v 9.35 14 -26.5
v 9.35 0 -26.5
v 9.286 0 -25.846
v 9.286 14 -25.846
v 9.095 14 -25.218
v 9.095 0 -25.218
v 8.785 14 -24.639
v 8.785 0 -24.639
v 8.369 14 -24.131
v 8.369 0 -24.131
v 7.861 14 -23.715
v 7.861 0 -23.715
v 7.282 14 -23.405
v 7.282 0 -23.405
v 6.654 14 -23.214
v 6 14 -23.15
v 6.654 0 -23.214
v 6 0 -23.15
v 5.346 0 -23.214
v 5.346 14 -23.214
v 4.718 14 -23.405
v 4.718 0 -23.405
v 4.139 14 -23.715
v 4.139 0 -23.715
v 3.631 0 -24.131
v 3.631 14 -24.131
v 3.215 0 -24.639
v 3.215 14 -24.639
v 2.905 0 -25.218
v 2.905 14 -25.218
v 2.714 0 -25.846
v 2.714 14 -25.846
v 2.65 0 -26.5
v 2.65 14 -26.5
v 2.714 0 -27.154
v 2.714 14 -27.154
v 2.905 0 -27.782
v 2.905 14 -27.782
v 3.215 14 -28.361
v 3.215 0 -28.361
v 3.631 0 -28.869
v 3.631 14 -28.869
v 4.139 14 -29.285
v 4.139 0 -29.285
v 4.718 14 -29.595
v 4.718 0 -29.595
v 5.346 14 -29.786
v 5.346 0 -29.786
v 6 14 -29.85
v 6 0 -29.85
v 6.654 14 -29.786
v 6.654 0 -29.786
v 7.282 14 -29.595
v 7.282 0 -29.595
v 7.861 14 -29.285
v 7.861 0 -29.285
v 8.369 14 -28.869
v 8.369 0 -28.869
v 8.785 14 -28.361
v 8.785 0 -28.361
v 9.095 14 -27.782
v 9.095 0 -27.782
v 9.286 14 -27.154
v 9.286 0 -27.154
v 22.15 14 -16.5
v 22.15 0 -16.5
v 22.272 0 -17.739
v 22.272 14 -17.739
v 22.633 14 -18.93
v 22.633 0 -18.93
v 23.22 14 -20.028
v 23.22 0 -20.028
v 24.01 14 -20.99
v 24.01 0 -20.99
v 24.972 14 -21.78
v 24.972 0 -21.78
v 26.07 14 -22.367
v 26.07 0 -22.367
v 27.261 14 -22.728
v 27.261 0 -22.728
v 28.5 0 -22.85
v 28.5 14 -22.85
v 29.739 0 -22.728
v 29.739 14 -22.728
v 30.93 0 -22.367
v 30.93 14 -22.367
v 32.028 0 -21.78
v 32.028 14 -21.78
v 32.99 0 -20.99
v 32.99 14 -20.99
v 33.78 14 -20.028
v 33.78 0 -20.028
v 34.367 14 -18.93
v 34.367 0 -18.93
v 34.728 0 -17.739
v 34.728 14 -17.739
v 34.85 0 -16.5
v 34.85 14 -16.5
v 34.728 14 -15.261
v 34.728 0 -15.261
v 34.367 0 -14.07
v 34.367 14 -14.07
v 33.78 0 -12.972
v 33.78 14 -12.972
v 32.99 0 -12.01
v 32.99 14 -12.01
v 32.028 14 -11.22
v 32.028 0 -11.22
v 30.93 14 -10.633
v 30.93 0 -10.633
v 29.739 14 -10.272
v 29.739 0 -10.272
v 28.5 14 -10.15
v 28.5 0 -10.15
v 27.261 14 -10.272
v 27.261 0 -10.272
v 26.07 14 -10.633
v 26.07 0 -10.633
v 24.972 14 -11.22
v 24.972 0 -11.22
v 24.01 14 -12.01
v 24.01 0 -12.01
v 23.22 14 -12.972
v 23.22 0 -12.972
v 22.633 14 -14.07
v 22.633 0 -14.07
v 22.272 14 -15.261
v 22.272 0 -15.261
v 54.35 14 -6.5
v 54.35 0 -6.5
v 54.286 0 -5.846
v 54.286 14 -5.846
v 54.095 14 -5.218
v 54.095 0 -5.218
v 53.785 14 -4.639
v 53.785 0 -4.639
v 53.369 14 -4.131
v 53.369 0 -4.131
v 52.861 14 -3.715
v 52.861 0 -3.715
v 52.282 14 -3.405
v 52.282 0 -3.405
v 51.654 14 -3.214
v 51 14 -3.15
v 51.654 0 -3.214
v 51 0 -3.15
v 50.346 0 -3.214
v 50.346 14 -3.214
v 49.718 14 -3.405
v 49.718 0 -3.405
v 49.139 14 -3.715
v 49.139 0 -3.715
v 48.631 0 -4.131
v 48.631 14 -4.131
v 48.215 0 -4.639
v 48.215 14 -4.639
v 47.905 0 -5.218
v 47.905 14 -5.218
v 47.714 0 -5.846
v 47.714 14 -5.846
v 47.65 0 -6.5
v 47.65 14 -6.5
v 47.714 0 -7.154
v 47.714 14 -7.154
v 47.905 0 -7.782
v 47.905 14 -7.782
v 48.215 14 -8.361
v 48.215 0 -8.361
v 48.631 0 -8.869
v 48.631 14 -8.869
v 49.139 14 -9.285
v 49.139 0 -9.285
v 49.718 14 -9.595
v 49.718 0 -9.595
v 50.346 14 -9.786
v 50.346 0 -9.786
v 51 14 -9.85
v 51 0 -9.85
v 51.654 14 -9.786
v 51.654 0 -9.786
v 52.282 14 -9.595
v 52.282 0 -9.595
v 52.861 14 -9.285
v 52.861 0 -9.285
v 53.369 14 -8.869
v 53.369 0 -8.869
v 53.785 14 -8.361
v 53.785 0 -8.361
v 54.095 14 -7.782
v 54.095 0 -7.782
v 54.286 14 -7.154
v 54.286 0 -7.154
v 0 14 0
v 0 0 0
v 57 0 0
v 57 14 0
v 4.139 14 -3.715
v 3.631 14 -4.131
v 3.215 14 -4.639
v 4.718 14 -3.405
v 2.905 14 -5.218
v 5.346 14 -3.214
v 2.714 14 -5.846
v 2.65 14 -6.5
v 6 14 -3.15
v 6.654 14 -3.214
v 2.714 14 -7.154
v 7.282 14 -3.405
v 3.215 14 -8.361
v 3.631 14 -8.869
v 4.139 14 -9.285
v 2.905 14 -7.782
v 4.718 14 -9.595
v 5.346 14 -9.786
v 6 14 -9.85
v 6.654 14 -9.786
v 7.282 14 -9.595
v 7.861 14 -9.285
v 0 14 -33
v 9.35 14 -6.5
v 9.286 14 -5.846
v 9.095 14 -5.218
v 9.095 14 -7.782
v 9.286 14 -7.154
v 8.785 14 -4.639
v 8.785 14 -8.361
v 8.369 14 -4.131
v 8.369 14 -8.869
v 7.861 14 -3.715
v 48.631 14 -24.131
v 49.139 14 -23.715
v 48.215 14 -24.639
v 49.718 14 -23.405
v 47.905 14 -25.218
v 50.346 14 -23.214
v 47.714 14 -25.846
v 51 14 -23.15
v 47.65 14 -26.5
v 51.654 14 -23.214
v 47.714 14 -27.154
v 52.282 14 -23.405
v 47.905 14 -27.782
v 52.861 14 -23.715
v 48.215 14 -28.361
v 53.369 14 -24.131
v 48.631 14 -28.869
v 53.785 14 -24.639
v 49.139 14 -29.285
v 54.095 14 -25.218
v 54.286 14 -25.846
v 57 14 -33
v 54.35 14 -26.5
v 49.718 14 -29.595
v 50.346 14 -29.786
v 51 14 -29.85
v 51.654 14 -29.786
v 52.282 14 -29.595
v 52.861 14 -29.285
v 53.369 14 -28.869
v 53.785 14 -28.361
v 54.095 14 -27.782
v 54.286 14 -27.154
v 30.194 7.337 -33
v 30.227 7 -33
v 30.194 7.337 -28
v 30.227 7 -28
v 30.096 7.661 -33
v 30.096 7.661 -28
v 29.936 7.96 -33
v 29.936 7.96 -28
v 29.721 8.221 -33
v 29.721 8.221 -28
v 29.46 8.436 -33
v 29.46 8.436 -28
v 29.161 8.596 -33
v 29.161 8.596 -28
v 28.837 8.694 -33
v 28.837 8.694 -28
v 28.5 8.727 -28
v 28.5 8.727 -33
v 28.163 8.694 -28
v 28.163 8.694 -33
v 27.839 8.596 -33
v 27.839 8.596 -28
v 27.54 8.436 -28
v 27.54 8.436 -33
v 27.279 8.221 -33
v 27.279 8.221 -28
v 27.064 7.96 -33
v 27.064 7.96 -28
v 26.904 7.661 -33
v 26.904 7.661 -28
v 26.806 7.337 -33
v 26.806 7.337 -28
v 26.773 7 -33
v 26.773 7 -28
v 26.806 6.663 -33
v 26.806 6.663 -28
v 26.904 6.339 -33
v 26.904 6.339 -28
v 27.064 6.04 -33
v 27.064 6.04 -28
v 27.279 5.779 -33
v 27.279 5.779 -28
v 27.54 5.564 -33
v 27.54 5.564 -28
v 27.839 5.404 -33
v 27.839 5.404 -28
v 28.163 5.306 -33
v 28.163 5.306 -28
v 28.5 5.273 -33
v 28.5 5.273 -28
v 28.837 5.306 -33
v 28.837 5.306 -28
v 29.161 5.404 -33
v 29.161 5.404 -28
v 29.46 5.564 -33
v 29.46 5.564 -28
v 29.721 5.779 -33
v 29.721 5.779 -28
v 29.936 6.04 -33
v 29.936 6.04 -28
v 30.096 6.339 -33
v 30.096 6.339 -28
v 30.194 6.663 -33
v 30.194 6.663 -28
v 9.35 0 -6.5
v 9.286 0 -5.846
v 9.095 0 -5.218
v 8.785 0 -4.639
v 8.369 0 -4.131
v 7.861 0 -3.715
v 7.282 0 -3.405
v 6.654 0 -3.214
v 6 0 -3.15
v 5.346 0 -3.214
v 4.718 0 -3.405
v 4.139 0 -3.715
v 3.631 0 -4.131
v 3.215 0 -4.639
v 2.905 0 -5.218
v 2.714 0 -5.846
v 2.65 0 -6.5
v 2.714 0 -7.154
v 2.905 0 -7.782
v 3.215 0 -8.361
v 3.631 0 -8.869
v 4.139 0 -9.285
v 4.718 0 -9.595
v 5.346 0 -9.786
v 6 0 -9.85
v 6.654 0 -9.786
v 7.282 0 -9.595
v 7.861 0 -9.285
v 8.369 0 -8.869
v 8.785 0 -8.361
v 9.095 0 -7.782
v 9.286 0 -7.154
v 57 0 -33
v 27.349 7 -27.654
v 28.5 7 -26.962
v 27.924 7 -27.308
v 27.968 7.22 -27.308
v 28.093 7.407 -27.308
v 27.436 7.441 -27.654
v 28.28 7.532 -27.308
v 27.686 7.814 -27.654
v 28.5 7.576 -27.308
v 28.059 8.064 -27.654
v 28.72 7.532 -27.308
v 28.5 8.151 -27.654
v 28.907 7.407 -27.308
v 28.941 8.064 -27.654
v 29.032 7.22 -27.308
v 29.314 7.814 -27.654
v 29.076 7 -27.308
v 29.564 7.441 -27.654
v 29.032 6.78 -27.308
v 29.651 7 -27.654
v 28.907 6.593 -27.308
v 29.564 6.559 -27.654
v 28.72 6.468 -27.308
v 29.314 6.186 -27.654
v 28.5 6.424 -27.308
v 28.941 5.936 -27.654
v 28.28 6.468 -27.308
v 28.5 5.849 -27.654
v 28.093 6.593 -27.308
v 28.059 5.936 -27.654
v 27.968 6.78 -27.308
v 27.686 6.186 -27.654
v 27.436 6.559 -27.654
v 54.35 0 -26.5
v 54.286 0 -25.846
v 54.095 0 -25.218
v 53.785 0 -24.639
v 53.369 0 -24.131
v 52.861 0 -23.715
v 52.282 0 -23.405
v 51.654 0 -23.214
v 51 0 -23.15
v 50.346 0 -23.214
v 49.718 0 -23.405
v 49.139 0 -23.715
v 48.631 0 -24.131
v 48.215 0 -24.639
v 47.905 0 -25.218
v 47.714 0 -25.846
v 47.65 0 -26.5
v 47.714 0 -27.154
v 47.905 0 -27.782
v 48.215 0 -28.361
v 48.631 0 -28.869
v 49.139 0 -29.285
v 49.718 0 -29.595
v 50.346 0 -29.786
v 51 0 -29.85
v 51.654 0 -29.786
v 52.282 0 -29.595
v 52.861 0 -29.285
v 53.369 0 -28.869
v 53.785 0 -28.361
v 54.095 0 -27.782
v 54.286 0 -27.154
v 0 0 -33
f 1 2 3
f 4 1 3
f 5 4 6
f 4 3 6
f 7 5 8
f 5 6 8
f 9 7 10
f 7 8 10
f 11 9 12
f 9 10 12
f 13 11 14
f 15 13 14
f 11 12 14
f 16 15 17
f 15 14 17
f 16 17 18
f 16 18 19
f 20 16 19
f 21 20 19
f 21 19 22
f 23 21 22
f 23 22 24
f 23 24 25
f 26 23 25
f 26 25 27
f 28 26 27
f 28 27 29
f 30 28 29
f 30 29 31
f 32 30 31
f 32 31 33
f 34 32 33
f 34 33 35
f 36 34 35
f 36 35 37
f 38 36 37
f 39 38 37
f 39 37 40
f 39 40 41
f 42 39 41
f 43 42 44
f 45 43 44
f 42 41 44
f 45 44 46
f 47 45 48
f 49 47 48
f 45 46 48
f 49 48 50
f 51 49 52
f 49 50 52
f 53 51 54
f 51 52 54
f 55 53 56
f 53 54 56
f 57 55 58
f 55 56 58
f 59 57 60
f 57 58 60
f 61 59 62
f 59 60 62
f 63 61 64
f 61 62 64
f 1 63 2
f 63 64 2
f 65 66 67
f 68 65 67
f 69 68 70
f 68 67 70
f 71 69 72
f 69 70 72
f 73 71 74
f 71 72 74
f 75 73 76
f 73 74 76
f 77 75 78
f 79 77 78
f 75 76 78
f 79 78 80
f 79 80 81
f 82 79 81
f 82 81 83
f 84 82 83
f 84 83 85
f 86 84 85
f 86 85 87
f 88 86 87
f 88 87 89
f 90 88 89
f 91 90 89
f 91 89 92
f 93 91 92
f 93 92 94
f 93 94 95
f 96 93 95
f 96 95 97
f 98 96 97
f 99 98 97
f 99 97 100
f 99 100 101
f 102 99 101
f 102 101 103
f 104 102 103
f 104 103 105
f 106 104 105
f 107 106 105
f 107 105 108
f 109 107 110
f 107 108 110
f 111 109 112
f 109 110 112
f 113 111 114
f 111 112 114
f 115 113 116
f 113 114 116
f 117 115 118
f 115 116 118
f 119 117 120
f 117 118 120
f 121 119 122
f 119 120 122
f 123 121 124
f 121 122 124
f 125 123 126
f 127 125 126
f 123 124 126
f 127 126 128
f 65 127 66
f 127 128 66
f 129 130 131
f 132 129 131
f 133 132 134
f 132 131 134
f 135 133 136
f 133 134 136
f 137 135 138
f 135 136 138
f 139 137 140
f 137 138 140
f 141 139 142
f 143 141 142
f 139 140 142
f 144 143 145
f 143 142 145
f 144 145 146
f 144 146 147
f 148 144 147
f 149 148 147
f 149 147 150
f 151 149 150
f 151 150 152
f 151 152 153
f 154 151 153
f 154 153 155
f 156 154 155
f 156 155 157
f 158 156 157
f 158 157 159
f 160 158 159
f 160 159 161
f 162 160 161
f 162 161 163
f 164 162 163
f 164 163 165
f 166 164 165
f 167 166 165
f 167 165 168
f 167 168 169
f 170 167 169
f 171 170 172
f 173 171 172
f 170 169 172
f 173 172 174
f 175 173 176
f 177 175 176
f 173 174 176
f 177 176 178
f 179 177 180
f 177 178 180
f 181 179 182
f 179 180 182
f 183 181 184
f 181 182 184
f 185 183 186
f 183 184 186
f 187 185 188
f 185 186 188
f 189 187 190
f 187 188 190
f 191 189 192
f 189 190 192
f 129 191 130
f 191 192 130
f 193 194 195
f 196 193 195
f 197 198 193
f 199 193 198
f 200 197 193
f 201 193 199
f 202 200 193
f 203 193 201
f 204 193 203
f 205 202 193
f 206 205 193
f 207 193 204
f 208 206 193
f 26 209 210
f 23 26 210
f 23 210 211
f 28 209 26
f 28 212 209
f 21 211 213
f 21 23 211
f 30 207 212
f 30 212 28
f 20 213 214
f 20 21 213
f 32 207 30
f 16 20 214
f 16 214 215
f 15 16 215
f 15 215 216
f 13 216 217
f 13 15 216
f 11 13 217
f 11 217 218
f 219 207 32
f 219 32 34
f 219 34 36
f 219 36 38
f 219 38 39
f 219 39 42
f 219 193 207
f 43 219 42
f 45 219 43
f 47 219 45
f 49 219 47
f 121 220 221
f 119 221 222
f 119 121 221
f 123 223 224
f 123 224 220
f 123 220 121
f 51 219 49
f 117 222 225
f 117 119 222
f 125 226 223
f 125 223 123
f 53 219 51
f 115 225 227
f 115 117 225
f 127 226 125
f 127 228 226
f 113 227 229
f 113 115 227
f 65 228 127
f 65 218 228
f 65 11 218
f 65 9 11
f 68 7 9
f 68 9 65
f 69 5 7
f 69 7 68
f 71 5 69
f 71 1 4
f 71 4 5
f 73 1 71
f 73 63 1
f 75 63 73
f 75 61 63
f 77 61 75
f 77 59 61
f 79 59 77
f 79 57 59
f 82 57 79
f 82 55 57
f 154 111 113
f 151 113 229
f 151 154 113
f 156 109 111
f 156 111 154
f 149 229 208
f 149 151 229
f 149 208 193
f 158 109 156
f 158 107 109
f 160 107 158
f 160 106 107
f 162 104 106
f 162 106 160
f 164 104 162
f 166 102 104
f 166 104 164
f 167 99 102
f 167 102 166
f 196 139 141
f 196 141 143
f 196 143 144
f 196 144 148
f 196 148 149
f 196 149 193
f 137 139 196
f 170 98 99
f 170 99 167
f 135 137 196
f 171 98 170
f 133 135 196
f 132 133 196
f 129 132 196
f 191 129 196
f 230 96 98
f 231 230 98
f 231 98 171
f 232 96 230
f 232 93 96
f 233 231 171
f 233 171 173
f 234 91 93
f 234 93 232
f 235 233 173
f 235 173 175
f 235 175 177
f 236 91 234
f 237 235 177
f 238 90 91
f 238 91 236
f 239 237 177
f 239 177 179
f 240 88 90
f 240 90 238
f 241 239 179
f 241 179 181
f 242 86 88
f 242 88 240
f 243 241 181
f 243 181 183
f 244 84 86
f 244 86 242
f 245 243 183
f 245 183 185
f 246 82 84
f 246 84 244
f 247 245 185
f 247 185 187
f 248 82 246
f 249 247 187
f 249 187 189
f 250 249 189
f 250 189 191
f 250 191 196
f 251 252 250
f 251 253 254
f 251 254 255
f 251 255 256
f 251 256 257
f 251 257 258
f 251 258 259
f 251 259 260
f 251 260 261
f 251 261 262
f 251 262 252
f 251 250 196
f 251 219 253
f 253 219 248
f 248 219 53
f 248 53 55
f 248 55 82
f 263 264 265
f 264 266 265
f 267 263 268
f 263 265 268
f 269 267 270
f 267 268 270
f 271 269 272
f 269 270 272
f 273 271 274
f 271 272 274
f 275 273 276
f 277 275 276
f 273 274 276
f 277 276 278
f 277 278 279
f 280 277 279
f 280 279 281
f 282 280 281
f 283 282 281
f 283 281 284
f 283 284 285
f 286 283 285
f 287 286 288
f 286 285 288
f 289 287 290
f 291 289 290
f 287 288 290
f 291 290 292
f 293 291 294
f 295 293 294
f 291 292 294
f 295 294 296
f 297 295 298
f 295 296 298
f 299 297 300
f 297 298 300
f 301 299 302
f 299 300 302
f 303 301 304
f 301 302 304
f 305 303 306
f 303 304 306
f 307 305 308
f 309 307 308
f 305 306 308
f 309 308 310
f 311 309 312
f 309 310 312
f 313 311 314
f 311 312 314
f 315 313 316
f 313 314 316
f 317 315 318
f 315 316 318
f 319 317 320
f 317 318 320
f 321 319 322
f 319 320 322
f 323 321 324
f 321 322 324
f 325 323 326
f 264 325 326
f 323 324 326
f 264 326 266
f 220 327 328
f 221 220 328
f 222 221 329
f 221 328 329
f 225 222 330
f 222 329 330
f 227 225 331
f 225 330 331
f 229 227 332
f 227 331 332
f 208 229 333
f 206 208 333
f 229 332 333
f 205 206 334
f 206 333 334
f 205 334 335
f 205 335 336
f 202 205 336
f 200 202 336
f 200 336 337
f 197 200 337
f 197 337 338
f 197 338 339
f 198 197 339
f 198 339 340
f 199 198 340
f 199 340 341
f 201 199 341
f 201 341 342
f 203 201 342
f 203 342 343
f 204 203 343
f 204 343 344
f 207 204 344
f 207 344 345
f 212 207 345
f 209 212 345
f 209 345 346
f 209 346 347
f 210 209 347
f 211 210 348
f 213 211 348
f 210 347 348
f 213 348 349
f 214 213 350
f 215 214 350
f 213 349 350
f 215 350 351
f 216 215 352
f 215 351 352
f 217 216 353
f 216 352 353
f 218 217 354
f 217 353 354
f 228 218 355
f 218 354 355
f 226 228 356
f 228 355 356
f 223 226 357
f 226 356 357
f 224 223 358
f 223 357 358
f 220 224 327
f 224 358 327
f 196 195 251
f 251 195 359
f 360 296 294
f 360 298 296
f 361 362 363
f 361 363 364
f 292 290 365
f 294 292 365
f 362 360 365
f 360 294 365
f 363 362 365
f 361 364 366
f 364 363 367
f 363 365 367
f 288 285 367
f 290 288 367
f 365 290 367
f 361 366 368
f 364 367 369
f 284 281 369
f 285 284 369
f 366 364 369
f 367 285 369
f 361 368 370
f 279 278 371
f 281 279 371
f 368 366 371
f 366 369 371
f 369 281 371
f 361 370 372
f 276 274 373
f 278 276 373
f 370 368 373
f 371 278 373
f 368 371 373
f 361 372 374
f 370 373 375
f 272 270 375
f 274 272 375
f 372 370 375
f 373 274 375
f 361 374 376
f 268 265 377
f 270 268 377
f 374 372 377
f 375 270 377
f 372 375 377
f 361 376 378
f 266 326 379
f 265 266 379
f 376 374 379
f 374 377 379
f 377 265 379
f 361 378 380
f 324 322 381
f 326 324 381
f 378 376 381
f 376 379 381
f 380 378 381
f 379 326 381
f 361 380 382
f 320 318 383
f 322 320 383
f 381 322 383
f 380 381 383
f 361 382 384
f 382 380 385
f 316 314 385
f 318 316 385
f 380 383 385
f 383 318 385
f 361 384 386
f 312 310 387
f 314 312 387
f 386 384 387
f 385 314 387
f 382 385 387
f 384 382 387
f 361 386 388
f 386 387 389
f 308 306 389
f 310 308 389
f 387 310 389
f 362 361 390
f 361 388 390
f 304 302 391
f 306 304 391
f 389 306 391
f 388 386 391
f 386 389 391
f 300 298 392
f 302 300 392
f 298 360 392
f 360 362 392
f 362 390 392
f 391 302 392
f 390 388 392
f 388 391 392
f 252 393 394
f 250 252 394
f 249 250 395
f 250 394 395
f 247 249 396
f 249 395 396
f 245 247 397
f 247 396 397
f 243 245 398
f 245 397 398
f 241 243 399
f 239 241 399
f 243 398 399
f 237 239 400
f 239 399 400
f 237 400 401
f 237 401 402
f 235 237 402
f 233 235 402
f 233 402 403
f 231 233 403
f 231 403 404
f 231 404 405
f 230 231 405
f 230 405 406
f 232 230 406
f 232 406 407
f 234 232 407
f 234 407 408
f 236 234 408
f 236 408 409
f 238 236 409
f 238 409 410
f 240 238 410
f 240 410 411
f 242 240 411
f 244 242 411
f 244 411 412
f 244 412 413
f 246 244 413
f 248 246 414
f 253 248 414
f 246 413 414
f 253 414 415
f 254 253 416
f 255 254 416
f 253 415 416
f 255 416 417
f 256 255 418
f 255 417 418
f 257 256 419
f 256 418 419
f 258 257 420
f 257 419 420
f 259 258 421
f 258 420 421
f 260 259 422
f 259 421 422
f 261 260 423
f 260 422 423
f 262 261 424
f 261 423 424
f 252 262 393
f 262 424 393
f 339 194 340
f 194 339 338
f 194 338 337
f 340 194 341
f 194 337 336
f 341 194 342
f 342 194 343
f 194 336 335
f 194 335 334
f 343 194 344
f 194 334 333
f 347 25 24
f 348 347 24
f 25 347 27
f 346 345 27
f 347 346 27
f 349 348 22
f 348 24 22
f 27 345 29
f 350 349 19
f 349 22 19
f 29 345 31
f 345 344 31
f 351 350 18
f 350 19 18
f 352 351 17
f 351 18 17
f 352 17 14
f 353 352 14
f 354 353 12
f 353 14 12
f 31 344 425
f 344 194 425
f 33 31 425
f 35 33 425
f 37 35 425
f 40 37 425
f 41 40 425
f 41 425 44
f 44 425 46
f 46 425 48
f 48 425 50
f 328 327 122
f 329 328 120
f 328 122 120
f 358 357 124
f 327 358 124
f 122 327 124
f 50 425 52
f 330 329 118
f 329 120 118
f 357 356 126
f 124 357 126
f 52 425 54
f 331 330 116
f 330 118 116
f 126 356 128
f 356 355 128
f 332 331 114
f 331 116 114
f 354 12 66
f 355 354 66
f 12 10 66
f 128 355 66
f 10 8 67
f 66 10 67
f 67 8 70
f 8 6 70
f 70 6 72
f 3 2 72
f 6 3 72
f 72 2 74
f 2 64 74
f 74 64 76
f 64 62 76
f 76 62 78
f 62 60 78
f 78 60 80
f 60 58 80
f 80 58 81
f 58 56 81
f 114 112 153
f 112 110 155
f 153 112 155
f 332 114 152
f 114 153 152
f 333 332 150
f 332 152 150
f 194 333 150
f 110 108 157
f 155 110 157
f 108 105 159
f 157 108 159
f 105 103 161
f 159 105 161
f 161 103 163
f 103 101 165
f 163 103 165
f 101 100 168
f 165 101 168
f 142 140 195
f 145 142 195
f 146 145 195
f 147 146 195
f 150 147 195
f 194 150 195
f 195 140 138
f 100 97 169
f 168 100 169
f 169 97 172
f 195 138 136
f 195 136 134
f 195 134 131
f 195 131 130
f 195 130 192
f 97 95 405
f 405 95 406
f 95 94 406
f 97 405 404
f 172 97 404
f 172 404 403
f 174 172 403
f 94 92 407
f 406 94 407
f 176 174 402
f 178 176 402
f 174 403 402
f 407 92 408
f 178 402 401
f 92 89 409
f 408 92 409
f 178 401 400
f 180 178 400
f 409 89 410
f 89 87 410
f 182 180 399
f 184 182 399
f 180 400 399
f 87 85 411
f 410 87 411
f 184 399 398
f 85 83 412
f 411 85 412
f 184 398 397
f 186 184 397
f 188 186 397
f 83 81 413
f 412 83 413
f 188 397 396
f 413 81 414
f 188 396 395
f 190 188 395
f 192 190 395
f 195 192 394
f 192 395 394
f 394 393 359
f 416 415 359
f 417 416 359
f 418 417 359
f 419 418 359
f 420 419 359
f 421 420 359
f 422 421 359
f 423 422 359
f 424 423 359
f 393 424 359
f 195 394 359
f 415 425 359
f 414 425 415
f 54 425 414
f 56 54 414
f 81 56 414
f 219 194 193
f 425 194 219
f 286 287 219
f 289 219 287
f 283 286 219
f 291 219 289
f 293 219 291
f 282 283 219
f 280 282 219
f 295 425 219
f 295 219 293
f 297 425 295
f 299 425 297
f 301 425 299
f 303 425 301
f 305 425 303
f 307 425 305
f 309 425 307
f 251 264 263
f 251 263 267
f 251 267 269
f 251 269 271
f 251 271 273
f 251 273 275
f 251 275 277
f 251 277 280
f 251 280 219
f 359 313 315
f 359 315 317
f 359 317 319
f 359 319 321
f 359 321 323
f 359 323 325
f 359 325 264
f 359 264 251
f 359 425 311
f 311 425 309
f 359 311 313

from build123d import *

# Parameters (mm, degrees)
SKETCH1_W                 = 57
SKETCH1_H                 = 33
BOSS_EXTRUDE1_DEPTH       = 14
SKETCH3_R                 = 3.35
CUT_EXTRUDE1_DEPTH        = 15
SKETCH4_R                 = 3.35
CUT_EXTRUDE2_DEPTH        = 15
SKETCH10_R                = 3.35
CUT_EXTRUDE5_DEPTH        = 15
SKETCH12_R                = 3.35
CUT_EXTRUDE6_DEPTH        = 15
F_8_32_TAPPED_HOLE1_D     = 3.4544
F_8_32_TAPPED_HOLE1_DEPTH = 5
F_8_32_TAPPED_HOLE1_TIP   = 1.037806461
F_0_535_40_TAPPED_HOLE1_D = 12.7


with BuildPart() as part:
    # Sketch1 → Boss-Extrude1 (new body)
    with BuildSketch(Plane(origin=(0, 0, 0), x_dir=(1, 0, 0), z_dir=(0, 1, 0))):
        with Locations((28.5, 16.5)):
            Rectangle(SKETCH1_W, SKETCH1_H)
    extrude(amount=BOSS_EXTRUDE1_DEPTH)

    # Sketch3 → Cut-Extrude1 (cut, through all)
    with BuildSketch(Plane.XZ):
        with Locations((6, -6.5)):
            Circle(SKETCH3_R)
    extrude(amount=-CUT_EXTRUDE1_DEPTH, mode=Mode.SUBTRACT)

    # Sketch4 → Cut-Extrude2 (cut, through all)
    with BuildSketch(Plane.XZ):
        with Locations((51, -26.5)):
            Circle(SKETCH4_R)
    extrude(amount=-CUT_EXTRUDE2_DEPTH, mode=Mode.SUBTRACT)

    # Sketch10 → Cut-Extrude5 (cut, through all)
    with BuildSketch(Plane.XZ):
        with Locations((6, -26.5)):
            Circle(SKETCH10_R)
    extrude(amount=-CUT_EXTRUDE5_DEPTH, mode=Mode.SUBTRACT)

    # Sketch12 → Cut-Extrude6 (cut, through all)
    with BuildSketch(Plane.XZ):
        with Locations((51, -6.5)):
            Circle(SKETCH12_R)
    extrude(amount=-CUT_EXTRUDE6_DEPTH, mode=Mode.SUBTRACT)

    # #8-32 Tapped Hole1
    with Locations(Plane(origin=(0, 0, -33), x_dir=(-1, 0, 0), z_dir=(0, 0, -1))):
        with Locations((-28.5, 7)):
            Hole(F_8_32_TAPPED_HOLE1_D / 2, depth=F_8_32_TAPPED_HOLE1_DEPTH)
            with Locations((0, 0, -(F_8_32_TAPPED_HOLE1_DEPTH + F_8_32_TAPPED_HOLE1_TIP / 2))):  # 118° drill point
                Cone(0, F_8_32_TAPPED_HOLE1_D / 2, F_8_32_TAPPED_HOLE1_TIP, mode=Mode.SUBTRACT)

    # 0.535-40 Tapped Hole1 (through all)
    with Locations(Plane(origin=(0, 14, 0), x_dir=(1, 0, 0), z_dir=(0, 1, 0))):
        with Locations((28.5, 16.5)):
            Hole(F_0_535_40_TAPPED_HOLE1_D / 2)


solid = part.part
